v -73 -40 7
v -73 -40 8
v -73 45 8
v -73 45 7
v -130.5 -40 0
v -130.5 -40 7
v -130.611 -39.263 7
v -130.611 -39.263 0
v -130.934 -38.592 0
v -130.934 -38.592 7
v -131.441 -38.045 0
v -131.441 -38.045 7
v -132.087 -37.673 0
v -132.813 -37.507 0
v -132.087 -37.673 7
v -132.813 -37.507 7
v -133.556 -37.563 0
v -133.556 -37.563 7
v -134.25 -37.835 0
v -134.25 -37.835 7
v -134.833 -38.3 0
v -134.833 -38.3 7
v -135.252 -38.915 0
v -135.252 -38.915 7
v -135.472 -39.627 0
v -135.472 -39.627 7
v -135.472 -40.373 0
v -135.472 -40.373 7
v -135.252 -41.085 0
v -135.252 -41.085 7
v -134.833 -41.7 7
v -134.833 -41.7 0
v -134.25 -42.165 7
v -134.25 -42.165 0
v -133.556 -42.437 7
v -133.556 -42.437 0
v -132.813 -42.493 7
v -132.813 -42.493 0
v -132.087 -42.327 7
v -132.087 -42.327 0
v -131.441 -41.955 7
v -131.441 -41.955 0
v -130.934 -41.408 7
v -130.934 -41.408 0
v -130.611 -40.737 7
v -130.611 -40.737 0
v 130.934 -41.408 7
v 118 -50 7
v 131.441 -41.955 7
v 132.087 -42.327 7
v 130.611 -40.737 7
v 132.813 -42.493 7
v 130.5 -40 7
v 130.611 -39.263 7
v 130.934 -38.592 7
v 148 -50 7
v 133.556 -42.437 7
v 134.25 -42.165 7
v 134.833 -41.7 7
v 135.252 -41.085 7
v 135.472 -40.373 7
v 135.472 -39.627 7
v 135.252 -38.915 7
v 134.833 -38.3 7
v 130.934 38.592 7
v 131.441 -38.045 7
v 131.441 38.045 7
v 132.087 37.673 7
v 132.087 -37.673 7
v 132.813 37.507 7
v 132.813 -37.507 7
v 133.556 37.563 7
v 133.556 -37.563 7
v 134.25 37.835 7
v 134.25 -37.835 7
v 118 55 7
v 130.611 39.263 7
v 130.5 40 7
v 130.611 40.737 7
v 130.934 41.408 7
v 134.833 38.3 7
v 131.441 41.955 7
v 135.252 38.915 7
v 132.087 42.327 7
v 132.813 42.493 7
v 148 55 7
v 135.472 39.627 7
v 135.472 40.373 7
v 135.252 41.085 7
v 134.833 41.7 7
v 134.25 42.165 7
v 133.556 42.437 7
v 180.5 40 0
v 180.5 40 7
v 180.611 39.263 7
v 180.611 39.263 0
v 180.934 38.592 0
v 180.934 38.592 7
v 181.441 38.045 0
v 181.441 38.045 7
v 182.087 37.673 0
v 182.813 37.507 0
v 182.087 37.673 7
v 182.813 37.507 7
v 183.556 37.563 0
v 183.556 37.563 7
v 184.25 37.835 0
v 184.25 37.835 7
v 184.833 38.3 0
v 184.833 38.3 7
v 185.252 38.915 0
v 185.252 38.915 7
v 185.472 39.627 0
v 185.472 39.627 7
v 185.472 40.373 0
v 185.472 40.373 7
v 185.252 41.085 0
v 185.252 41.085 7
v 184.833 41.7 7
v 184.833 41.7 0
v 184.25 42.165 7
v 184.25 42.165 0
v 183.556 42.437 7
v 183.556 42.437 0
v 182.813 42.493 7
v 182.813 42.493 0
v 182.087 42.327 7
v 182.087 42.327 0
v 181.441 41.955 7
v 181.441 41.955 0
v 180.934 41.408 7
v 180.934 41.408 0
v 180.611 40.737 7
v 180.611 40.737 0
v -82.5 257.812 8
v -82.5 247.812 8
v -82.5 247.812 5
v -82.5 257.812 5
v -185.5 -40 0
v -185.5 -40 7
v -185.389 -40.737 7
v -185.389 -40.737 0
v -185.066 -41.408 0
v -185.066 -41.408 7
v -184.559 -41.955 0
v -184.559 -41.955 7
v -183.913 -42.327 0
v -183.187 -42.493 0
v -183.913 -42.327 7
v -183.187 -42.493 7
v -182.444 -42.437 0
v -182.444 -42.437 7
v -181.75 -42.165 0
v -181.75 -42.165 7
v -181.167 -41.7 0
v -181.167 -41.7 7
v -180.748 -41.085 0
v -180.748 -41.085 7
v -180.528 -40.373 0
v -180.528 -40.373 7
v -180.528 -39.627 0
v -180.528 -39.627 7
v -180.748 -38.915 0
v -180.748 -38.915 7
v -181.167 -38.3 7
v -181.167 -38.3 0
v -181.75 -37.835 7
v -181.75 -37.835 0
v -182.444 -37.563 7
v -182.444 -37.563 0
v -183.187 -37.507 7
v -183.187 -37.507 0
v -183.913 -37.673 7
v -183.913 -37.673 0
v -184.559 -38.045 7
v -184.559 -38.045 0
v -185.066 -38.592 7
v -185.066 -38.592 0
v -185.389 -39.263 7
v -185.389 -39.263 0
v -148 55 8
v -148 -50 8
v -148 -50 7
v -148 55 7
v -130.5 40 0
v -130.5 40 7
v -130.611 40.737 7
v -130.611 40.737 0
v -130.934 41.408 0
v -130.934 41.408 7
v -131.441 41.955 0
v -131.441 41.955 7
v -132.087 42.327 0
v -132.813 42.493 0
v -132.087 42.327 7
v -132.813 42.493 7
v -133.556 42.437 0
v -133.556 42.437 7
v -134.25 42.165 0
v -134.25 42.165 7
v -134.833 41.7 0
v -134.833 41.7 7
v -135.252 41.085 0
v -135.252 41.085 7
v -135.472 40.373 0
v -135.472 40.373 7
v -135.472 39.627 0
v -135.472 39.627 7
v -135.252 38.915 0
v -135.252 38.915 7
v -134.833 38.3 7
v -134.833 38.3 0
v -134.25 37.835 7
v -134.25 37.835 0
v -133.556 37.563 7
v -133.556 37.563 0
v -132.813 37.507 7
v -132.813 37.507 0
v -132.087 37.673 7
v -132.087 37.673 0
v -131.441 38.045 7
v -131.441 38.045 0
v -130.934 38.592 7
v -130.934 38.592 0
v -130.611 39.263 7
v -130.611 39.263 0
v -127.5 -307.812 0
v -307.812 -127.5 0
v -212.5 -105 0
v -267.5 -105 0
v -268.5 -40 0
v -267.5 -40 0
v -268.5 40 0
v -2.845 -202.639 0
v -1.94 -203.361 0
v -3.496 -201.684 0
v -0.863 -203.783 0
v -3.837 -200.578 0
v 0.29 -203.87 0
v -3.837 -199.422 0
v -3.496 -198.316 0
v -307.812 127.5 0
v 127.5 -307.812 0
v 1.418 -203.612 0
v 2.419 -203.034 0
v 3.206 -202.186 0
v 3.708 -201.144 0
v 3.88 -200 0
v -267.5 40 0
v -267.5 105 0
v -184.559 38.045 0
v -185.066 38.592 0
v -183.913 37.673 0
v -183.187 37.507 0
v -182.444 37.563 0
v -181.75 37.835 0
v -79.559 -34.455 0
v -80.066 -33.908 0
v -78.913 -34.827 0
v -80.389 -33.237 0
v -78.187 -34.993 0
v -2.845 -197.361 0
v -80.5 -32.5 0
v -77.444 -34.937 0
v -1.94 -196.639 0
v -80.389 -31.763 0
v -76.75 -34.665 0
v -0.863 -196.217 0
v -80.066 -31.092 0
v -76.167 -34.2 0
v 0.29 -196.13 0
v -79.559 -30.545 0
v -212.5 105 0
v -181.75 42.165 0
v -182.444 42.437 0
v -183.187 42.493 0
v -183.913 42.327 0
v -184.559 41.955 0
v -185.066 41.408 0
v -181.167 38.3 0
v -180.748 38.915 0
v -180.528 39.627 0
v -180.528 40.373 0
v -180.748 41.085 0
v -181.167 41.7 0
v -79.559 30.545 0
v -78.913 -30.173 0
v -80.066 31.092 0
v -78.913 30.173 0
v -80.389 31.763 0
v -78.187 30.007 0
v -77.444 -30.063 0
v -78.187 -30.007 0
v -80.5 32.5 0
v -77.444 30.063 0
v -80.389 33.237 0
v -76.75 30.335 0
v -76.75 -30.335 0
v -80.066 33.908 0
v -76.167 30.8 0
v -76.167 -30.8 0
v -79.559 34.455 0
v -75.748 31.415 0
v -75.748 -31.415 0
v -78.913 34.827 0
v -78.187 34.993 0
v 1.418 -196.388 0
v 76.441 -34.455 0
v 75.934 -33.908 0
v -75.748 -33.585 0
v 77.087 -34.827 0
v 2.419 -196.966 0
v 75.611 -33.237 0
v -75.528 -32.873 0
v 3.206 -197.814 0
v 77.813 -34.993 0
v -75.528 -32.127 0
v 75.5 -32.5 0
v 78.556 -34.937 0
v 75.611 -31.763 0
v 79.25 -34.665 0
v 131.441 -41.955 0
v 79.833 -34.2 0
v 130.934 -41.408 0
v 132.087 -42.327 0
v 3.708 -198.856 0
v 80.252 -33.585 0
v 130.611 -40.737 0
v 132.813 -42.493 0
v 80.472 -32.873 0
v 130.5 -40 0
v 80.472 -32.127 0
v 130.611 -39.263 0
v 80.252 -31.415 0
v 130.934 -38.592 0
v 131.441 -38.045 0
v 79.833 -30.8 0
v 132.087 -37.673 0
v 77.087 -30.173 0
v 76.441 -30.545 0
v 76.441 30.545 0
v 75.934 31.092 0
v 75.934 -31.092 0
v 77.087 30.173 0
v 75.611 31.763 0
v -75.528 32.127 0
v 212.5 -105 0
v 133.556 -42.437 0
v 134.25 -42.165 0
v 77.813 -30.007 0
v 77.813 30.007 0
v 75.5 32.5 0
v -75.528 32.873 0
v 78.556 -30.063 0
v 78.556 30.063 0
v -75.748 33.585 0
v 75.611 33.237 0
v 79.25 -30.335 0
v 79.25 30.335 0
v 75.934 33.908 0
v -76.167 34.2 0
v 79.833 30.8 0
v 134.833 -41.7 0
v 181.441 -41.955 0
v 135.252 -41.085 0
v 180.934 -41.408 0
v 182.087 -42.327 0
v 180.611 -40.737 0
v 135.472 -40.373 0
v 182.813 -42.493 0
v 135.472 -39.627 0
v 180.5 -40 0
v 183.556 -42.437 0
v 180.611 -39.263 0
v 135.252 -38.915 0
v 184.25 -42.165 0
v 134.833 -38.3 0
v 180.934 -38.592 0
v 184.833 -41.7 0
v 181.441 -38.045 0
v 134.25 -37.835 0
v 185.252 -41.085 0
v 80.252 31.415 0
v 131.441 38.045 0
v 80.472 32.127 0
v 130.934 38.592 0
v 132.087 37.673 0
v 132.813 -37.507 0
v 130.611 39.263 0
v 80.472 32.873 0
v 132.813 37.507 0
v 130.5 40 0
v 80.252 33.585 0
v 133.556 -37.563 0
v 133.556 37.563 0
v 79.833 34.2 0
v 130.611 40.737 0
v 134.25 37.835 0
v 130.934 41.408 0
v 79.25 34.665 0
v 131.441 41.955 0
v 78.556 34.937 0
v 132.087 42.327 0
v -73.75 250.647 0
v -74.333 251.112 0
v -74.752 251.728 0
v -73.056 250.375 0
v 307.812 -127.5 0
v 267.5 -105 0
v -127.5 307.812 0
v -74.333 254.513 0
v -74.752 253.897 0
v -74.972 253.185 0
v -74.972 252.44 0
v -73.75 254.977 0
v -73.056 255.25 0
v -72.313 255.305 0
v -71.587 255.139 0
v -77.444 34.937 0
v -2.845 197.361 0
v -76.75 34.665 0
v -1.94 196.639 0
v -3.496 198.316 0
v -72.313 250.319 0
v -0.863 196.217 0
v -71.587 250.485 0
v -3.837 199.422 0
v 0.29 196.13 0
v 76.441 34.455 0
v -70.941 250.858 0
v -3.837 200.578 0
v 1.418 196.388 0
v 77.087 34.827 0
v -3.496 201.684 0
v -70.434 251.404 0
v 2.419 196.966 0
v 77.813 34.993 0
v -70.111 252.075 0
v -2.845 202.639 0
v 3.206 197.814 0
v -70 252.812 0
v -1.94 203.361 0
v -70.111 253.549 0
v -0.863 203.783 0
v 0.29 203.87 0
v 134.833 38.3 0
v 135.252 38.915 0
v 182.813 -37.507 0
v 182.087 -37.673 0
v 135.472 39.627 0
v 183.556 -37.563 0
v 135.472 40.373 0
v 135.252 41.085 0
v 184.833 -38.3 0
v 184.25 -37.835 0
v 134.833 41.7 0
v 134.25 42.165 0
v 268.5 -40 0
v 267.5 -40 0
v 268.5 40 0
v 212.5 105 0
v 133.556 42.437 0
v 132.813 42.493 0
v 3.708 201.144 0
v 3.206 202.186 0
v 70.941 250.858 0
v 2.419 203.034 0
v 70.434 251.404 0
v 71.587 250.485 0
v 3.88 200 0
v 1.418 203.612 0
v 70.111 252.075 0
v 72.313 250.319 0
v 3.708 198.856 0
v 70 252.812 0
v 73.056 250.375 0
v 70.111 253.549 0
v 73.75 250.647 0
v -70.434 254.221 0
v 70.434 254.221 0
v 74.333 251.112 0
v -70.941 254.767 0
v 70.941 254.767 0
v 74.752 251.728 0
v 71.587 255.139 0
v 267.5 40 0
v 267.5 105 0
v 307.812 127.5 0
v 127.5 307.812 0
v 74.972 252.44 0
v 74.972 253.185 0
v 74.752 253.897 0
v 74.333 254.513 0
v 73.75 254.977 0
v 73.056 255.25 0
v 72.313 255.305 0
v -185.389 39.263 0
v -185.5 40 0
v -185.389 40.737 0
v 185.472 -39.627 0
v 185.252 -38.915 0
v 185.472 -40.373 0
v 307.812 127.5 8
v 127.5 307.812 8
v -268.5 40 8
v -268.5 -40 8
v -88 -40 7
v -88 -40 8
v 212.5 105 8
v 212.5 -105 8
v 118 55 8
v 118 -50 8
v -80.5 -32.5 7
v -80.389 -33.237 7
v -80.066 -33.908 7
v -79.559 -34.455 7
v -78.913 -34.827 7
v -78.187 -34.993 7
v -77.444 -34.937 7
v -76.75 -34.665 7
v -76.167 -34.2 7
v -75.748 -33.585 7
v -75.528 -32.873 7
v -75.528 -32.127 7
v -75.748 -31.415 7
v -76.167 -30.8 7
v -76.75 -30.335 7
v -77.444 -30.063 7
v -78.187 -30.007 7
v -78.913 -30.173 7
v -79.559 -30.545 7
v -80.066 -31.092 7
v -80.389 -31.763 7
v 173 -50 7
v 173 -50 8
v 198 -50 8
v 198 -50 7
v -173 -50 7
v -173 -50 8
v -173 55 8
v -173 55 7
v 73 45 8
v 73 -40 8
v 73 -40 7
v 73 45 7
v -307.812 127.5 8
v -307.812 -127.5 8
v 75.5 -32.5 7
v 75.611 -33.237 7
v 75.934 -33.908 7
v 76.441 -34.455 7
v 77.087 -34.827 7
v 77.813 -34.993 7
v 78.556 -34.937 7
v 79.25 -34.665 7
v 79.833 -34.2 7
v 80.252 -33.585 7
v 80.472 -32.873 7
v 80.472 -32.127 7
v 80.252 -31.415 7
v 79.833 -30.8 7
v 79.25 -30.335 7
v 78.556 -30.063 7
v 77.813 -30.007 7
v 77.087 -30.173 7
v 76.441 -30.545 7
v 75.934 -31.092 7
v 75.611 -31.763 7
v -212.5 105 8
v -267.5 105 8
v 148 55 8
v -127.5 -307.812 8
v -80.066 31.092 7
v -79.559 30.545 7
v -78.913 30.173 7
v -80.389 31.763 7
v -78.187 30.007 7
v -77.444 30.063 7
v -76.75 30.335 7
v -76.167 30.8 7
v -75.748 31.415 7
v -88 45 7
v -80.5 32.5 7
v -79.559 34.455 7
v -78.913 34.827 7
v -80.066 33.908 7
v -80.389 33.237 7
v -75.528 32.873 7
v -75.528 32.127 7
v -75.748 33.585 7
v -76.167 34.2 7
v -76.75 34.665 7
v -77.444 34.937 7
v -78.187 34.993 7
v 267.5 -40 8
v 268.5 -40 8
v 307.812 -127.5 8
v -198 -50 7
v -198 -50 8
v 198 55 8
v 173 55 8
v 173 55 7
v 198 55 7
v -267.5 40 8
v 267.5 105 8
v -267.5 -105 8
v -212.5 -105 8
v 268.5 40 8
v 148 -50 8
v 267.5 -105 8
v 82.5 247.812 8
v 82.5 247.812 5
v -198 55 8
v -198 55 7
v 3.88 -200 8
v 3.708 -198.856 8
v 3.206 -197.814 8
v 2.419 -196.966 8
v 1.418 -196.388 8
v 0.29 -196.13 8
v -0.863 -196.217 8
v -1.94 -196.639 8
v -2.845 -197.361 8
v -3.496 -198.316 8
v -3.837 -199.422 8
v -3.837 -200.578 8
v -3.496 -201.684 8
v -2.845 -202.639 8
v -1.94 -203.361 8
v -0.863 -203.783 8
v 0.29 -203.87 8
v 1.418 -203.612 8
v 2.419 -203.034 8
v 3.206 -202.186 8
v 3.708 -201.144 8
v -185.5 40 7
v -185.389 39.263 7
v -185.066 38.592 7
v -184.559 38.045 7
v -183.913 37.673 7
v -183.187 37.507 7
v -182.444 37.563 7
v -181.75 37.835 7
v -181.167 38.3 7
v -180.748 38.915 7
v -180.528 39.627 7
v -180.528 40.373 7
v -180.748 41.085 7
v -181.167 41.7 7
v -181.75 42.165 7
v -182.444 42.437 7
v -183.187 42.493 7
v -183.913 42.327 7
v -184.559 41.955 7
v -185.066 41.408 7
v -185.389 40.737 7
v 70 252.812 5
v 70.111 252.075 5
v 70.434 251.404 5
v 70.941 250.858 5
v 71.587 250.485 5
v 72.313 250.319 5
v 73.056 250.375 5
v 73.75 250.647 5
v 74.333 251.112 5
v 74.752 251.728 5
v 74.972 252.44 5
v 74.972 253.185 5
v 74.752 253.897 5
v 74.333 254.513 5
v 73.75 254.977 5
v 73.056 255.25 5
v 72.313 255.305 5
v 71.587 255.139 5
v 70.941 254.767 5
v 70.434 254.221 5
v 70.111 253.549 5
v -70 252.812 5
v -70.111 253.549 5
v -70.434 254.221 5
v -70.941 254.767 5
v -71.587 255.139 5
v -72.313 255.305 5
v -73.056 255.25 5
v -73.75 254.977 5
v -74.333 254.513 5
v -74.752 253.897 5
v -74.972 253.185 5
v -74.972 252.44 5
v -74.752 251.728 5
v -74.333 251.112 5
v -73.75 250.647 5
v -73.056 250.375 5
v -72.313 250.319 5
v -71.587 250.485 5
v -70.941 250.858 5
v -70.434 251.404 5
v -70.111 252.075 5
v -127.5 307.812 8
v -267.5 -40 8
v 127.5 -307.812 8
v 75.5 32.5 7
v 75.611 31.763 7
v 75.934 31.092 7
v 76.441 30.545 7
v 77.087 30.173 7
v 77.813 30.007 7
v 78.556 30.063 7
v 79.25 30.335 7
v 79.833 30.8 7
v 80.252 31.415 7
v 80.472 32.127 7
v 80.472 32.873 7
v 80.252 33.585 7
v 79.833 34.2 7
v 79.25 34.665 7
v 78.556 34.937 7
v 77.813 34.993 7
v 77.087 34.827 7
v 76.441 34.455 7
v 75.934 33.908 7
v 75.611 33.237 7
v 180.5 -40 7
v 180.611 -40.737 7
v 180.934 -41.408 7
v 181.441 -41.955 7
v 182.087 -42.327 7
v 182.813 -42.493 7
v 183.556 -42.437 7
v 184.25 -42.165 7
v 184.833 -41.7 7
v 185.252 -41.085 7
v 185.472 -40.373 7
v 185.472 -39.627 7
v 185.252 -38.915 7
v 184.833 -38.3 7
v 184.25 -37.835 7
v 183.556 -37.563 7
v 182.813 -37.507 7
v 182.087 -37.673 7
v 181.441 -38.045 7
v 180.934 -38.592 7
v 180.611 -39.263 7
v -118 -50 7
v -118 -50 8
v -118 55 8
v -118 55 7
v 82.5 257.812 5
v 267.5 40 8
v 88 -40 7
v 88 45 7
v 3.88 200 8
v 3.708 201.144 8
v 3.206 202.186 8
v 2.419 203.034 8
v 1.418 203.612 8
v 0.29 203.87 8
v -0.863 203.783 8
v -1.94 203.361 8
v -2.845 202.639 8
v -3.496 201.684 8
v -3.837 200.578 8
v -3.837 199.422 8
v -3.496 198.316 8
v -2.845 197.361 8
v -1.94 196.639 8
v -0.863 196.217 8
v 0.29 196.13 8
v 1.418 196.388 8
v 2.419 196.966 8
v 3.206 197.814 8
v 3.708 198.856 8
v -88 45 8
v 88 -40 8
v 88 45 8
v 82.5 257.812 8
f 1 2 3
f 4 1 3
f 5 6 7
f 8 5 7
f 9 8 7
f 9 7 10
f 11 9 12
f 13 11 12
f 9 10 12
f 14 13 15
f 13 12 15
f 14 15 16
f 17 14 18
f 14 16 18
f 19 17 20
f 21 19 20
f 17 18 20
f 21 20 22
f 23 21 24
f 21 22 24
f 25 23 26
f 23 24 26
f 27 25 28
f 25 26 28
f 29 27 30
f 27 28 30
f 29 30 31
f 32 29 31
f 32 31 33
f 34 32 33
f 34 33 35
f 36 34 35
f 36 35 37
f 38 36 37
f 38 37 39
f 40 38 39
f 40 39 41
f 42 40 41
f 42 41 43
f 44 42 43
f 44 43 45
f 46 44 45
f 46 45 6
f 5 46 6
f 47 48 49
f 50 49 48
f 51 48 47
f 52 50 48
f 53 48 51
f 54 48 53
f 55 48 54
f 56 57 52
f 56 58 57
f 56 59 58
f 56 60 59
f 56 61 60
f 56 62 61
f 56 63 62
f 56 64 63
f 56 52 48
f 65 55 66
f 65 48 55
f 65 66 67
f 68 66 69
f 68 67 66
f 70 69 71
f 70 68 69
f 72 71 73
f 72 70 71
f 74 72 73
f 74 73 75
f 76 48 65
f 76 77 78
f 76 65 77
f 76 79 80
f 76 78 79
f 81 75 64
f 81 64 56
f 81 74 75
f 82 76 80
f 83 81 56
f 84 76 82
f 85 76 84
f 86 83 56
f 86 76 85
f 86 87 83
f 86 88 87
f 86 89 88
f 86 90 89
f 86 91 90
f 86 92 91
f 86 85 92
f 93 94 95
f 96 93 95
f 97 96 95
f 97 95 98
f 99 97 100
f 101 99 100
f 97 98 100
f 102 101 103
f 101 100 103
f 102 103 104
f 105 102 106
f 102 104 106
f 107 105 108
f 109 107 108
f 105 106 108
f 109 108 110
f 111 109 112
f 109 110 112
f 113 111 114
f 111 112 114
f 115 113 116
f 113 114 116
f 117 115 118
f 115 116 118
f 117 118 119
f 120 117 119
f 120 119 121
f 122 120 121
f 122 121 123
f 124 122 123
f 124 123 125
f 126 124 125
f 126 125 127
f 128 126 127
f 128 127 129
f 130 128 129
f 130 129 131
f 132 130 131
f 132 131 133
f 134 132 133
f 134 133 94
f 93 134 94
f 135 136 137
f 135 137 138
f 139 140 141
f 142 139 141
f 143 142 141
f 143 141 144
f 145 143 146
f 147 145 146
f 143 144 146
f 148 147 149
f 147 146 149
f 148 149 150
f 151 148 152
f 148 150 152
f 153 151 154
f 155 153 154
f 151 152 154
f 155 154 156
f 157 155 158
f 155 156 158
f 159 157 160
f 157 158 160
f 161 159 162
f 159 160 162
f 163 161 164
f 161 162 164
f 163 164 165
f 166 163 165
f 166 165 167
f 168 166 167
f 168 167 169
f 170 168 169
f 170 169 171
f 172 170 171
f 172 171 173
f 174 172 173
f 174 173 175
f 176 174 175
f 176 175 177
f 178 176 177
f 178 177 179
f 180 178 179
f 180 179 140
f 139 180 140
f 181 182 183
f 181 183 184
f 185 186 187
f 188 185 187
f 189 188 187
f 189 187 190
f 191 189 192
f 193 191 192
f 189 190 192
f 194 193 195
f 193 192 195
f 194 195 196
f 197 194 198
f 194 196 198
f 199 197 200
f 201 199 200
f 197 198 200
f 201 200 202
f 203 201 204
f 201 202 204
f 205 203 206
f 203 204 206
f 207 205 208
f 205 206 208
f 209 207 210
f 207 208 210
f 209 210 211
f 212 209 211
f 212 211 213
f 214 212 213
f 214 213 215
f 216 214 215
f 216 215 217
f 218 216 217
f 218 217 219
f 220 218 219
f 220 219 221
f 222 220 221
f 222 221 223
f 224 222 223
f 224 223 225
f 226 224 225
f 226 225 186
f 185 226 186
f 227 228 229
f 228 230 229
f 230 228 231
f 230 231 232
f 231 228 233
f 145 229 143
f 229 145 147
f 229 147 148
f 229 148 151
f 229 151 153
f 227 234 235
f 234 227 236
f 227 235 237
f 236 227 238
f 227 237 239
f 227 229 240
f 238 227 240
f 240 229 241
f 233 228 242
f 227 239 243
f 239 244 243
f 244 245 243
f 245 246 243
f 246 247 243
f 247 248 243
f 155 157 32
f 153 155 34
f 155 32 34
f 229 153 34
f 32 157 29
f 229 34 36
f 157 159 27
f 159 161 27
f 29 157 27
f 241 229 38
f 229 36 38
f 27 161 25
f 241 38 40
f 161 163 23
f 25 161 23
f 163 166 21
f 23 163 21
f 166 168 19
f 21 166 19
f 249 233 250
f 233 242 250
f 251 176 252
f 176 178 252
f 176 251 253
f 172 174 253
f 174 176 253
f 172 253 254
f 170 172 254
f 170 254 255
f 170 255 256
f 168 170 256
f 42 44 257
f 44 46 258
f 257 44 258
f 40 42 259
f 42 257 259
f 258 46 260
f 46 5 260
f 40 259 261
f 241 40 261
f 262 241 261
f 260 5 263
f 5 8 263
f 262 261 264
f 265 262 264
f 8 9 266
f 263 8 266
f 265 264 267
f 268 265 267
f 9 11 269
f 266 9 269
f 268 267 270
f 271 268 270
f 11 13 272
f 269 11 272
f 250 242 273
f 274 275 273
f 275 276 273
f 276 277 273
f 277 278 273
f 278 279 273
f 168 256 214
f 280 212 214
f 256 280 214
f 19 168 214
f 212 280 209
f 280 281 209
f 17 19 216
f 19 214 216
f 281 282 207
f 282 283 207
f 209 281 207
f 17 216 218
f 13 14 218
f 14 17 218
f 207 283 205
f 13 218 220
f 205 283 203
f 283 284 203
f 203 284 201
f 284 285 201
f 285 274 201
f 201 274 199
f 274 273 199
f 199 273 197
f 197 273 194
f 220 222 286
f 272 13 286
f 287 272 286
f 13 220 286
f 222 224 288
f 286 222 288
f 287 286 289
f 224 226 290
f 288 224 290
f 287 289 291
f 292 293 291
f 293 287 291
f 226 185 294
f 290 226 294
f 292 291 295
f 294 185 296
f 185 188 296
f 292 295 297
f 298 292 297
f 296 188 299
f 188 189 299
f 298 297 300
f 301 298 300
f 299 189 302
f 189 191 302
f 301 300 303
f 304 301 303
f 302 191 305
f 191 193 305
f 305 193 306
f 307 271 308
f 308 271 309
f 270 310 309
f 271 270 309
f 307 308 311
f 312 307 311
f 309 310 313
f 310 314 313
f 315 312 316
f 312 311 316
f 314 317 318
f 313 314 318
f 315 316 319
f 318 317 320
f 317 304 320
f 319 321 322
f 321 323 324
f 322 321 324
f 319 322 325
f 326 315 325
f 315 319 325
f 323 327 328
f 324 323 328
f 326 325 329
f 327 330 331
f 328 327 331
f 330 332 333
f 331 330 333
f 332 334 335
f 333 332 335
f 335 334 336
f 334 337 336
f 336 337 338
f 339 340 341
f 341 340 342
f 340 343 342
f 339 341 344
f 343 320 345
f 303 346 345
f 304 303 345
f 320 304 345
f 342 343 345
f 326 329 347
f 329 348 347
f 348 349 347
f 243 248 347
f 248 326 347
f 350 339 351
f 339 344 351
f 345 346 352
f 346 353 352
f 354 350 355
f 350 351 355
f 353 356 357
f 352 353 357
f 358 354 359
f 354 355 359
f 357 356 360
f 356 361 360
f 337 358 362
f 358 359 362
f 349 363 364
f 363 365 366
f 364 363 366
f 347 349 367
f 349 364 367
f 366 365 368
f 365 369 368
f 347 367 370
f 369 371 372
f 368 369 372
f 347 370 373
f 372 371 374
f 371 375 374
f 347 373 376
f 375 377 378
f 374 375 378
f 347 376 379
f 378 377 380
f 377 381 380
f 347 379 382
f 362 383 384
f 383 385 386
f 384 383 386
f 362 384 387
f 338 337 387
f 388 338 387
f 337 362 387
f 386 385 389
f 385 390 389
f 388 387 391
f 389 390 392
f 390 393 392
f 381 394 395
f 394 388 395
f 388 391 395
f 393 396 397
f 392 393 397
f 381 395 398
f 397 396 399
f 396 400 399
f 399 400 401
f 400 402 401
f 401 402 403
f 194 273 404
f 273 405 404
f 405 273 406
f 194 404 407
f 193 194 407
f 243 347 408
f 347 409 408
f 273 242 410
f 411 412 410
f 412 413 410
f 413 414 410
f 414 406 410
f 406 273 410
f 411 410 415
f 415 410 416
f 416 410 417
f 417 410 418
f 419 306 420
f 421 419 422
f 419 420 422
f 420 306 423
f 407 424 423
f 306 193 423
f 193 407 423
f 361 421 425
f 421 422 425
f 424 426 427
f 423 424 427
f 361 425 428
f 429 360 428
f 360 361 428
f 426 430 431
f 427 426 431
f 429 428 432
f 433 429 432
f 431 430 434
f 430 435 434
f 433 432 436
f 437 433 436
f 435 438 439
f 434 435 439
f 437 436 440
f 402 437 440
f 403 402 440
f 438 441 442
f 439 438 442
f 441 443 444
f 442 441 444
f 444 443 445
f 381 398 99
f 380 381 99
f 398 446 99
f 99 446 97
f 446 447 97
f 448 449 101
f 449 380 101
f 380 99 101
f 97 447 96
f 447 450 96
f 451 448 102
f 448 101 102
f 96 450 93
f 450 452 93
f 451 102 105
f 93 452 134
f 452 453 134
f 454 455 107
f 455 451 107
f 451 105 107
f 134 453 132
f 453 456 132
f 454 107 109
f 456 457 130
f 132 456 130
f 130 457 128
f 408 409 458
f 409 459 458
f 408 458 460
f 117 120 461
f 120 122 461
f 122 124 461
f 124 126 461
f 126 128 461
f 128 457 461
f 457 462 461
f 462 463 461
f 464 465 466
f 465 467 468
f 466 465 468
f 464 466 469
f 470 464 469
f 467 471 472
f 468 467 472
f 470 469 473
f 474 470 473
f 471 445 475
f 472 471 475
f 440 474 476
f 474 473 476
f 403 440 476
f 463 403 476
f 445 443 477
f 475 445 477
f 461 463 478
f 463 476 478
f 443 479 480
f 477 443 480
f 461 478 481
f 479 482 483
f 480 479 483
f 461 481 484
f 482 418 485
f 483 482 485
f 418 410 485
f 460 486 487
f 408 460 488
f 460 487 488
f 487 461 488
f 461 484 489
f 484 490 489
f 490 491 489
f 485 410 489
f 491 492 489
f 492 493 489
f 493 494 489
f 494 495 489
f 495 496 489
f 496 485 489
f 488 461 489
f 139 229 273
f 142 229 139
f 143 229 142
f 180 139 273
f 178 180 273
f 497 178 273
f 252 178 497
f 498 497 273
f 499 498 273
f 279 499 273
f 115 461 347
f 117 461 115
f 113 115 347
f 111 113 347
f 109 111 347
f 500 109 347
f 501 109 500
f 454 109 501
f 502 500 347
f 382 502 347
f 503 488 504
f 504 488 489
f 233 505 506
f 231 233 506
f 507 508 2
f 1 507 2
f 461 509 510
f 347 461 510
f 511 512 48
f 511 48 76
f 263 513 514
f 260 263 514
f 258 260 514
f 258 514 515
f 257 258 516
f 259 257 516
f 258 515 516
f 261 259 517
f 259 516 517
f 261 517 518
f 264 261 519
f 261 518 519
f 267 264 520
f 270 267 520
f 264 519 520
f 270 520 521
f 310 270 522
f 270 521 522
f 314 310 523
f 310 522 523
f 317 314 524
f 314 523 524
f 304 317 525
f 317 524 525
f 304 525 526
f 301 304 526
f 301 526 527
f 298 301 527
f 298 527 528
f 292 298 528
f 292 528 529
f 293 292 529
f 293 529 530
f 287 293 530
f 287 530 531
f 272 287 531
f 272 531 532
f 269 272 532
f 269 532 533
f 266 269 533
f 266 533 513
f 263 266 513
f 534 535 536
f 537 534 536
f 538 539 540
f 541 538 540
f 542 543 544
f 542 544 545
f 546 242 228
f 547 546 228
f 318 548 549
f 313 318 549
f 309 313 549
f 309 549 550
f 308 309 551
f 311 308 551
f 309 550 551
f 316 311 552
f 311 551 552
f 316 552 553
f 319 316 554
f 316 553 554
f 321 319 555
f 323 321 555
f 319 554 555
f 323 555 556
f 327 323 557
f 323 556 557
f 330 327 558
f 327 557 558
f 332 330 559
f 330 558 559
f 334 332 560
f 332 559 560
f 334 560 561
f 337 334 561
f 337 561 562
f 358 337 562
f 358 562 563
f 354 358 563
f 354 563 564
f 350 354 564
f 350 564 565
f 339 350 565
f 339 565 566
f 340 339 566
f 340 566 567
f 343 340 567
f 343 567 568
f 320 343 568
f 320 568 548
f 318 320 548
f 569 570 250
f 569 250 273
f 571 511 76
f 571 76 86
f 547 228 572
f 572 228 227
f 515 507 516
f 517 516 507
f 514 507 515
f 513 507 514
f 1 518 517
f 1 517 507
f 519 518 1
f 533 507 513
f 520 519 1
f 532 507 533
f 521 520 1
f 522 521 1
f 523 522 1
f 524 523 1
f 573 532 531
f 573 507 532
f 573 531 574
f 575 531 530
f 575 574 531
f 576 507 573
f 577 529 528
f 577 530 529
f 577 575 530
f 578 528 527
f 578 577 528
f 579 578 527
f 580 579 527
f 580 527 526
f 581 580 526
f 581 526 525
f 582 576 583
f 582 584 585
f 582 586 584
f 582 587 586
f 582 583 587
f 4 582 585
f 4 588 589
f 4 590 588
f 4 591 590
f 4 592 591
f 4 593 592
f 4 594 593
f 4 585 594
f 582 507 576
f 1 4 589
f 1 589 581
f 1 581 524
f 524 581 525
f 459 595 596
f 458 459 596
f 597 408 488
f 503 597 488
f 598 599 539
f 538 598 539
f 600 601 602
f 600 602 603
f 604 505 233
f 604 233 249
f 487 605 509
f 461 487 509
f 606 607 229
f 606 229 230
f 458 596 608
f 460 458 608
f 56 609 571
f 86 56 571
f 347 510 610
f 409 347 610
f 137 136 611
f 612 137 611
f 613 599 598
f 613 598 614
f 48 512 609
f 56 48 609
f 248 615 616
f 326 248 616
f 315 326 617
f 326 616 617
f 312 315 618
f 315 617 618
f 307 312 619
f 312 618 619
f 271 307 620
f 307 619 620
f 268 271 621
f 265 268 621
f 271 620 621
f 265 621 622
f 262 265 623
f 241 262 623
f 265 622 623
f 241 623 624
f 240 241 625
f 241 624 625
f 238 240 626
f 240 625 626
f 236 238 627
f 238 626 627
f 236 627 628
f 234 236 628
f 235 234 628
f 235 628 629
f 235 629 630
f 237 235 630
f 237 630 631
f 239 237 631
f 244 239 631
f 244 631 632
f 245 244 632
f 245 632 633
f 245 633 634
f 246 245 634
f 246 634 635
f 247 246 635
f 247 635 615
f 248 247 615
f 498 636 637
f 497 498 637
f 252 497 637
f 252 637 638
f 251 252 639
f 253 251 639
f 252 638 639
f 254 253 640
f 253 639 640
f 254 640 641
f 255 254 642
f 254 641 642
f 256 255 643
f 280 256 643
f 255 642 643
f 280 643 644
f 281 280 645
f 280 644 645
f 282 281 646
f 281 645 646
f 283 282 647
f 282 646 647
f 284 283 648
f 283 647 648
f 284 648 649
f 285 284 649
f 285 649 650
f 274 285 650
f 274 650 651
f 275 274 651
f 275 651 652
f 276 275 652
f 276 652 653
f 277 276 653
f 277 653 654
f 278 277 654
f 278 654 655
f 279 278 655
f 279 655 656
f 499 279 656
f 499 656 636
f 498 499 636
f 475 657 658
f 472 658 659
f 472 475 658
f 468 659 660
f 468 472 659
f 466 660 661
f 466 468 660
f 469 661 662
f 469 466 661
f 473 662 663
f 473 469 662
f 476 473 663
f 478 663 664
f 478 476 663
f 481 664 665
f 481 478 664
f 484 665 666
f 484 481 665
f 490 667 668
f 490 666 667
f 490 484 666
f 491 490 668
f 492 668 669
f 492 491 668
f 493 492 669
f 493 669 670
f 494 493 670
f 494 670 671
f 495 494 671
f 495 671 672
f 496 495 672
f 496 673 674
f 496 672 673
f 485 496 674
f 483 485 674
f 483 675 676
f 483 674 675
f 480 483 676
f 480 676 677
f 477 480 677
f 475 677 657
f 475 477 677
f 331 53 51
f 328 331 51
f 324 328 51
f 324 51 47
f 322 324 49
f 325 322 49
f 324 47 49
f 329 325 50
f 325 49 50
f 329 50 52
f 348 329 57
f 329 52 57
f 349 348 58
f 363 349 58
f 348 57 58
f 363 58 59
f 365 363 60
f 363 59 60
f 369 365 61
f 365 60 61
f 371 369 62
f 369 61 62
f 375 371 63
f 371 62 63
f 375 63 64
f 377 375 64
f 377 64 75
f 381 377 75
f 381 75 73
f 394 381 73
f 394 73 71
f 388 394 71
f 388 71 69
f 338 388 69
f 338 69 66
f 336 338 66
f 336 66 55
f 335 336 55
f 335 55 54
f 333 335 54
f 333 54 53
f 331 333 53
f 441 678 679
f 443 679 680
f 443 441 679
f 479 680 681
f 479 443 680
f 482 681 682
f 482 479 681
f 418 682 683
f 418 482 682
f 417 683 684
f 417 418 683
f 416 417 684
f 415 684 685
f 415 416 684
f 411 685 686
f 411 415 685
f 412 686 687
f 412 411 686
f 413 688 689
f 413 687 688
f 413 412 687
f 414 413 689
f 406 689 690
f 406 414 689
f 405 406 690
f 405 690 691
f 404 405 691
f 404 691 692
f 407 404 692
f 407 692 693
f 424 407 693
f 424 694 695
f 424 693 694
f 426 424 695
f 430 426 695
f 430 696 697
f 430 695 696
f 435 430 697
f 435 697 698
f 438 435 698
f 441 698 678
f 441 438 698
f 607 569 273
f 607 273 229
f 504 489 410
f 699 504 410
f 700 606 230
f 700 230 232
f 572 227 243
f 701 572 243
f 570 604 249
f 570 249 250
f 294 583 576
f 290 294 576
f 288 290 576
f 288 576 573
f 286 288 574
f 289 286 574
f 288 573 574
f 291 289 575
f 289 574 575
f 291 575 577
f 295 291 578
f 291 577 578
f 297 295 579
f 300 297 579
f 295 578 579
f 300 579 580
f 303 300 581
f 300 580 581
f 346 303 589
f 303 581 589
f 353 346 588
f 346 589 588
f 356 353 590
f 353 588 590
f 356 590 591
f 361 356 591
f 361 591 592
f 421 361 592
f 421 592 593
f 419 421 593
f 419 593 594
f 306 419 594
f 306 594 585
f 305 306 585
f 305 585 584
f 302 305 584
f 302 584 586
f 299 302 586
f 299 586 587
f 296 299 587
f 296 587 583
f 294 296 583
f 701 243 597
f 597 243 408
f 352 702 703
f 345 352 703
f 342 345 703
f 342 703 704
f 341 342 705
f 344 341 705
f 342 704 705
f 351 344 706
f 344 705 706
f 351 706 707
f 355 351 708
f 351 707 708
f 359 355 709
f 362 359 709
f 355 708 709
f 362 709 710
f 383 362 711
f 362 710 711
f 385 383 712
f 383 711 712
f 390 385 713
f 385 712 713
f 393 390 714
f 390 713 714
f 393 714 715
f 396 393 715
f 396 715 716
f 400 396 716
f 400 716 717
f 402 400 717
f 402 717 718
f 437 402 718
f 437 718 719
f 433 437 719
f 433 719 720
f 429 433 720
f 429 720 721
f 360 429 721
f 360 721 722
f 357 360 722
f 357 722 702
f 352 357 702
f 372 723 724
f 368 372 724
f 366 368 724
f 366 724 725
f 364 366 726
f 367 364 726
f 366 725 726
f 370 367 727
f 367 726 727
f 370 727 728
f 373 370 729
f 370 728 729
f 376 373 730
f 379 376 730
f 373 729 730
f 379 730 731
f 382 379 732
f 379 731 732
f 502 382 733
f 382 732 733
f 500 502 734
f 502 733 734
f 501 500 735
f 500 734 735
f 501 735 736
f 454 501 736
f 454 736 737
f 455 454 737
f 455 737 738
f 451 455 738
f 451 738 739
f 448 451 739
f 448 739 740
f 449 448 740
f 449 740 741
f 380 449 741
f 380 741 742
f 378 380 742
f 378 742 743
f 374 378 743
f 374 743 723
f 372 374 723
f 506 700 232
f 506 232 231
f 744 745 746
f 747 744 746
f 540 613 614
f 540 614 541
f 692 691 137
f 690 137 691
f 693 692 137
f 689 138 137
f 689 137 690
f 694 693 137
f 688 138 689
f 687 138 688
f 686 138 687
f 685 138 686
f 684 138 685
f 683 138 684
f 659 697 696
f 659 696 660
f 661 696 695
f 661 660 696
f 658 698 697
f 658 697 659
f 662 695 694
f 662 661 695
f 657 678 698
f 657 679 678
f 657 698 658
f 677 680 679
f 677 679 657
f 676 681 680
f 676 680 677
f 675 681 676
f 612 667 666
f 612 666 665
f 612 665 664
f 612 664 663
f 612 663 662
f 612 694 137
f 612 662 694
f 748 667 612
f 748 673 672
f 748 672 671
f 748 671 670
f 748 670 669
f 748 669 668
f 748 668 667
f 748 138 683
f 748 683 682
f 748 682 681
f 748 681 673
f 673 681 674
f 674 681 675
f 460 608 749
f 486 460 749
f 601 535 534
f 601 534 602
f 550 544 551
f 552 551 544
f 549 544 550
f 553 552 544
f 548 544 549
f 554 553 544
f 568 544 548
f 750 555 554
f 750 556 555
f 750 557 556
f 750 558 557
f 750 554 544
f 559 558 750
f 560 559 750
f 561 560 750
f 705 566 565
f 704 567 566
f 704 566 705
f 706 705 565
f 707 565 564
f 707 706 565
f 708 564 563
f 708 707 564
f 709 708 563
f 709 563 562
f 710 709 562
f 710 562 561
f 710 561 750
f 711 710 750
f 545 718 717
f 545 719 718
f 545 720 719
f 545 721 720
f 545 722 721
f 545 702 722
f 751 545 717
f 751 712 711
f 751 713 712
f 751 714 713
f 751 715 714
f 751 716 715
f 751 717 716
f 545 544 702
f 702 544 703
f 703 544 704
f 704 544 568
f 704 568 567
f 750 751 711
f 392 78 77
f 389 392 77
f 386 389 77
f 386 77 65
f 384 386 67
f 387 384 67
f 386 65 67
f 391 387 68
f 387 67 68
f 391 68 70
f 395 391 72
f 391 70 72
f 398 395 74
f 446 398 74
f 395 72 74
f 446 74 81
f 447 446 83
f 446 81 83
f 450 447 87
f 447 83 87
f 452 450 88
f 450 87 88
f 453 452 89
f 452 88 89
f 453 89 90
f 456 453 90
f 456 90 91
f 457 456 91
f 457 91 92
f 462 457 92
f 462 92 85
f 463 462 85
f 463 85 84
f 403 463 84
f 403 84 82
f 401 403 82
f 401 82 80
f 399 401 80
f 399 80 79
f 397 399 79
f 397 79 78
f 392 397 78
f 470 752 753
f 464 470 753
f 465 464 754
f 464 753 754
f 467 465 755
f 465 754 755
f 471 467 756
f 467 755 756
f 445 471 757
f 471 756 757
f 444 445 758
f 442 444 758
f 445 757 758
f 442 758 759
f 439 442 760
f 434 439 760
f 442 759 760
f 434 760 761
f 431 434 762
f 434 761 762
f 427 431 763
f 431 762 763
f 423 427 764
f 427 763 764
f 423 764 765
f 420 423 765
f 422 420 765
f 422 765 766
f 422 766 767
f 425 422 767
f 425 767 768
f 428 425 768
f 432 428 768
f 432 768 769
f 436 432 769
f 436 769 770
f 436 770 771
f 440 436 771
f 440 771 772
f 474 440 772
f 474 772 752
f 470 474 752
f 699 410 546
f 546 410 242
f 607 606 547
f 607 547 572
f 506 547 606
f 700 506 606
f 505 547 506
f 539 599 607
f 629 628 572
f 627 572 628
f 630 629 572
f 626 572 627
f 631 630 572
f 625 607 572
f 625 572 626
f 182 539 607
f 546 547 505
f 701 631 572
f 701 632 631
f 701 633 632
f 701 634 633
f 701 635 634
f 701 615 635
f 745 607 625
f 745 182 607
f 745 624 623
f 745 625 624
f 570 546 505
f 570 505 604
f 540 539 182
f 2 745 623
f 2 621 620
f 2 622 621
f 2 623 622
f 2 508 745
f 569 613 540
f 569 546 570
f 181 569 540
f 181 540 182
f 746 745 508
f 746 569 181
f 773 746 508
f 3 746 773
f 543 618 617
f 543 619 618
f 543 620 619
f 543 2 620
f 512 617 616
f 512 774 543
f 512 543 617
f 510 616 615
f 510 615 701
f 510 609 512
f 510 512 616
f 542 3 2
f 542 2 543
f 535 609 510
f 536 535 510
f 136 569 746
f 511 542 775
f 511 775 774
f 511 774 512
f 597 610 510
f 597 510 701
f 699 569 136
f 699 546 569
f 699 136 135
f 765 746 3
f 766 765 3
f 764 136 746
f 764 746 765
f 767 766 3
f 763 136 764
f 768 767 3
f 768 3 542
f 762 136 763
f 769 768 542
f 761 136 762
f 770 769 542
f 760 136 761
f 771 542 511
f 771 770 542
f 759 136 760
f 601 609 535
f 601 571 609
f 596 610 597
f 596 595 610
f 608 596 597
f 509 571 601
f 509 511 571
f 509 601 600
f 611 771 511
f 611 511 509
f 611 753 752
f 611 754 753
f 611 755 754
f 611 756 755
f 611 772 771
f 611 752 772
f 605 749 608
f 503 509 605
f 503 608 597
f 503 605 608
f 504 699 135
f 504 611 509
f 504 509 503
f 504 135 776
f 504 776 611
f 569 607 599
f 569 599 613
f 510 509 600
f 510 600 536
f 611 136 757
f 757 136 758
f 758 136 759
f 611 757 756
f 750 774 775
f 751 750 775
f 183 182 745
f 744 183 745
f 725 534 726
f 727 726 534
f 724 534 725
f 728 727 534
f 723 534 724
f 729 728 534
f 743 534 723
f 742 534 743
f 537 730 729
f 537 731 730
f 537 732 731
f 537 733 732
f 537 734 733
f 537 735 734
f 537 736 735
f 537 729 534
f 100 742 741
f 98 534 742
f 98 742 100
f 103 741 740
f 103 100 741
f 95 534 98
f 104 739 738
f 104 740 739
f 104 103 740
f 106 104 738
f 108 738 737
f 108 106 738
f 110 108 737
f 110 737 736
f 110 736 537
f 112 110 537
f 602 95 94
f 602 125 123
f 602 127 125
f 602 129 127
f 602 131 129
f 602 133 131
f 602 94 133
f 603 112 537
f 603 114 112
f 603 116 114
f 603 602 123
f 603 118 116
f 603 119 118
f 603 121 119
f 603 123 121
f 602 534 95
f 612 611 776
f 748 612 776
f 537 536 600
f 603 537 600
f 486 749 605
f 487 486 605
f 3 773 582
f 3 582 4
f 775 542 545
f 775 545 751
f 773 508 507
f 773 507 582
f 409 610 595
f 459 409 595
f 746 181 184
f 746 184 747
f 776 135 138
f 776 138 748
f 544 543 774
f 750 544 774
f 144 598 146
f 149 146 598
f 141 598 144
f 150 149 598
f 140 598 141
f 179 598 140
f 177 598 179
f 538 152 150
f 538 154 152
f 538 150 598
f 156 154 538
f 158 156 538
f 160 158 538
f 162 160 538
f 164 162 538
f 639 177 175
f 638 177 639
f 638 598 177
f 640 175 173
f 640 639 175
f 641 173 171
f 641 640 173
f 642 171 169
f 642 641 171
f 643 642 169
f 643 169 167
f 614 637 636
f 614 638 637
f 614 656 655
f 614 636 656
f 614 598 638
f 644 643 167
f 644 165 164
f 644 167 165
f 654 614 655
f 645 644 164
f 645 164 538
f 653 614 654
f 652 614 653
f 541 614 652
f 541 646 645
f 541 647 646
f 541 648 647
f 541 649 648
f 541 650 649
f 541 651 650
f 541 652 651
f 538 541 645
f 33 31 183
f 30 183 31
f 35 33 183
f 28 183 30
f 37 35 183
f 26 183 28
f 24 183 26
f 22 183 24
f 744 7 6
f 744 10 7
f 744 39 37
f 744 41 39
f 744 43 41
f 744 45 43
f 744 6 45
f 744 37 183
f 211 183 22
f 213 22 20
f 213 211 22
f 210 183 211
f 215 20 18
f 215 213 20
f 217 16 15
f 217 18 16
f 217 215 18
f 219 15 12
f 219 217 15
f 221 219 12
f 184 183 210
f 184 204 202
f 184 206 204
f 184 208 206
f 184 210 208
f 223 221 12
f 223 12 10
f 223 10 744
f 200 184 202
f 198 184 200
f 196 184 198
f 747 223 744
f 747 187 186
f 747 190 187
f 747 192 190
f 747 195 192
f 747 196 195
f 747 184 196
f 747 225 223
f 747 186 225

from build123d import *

# Parameters (mm, degrees)
BOSS_EXTRUDE1_DEPTH = 8
SKETCH2_R           = 3.8805
CUT_EXTRUDE1_DEPTH  = 10
SKETCH5_W           = 15
SKETCH5_H           = 85
SKETCH5_R           = 2.5
SKETCH5_W_2         = 25
SKETCH5_H_2         = 105
SKETCH5_W_3         = 30
CUT_EXTRUDE4_DEPTH  = 1
CUT_EXTRUDE7_START  = 91
SKETCH10_R          = 2.5
CUT_EXTRUDE7_DEPTH  = 91
SKETCH12_W          = 165
SKETCH12_H          = 10
SKETCH12_R          = 2
CUT_EXTRUDE11_DEPTH = 3
SKETCH14_R          = 2.5
CUT_EXTRUDE14_DEPTH = 22


with BuildPart() as part:
    # Sketch1 → Boss-Extrude1 (new body)
    with BuildSketch(Plane.XY):
        Polygon((307.812229203, 127.5), (127.5, 307.812229203), (-127.5, 307.812229203), (-307.812229203, 127.5), (-307.812229203, -127.5), (-127.5, -307.812229203), (127.5, -307.812229203), (307.812229203, -127.5), align=None)
    extrude(amount=BOSS_EXTRUDE1_DEPTH)

    # Sketch2 → Cut-Extrude1 (cut)
    with BuildSketch(Plane.XY.offset(8)):
        with Locations((0, 200)):
            Circle(SKETCH2_R)
        with Locations((0, -200)):
            Circle(SKETCH2_R)
        Polygon((212.5, 105), (212.5, -105), (267.5, -105), (267.5, -40), (268.5, -40), (268.5, 0), (268.5, 40), (267.5, 40), (267.5, 105), align=None)
        Polygon((-267.5, 105), (-212.5, 105), (-212.5, -105), (-267.5, -105), (-267.5, -40), (-268.5, -40), (-268.5, 0), (-268.5, 40), (-267.5, 40), align=None)
    extrude(amount=-CUT_EXTRUDE1_DEPTH, mode=Mode.SUBTRACT)

    # Sketch5 → Cut-Extrude4 (cut)
    # profile 1 of 6: a face of its own
    with BuildSketch(Plane.XY.offset(8)):
        with Locations((80.5, 2.5)):
            Rectangle(SKETCH5_W, SKETCH5_H)
        with Locations((78, 32.5)):
            Circle(SKETCH5_R, mode=Mode.SUBTRACT)
        with Locations((78, -32.5)):
            Circle(SKETCH5_R, mode=Mode.SUBTRACT)
    # profile 2 of 6: a face of its own
    with BuildSketch(Plane.XY.offset(8)):
        with Locations((-185.5, 2.5)):
            Rectangle(SKETCH5_W_2, SKETCH5_H_2)
        with Locations((-183, -40)):
            Circle(SKETCH5_R, mode=Mode.SUBTRACT)
        with Locations((-183, 40)):
            Circle(SKETCH5_R, mode=Mode.SUBTRACT)
    # profile 3 of 6: a face of its own
    with BuildSketch(Plane.XY.offset(8)):
        with Locations((-133, 2.5)):
            Rectangle(SKETCH5_W_3, SKETCH5_H_2)
        with Locations((-133, -40)):
            Circle(SKETCH5_R, mode=Mode.SUBTRACT)
        with Locations((-133, 40)):
            Circle(SKETCH5_R, mode=Mode.SUBTRACT)
    # profile 4 of 6: a face of its own
    with BuildSketch(Plane.XY.offset(8)):
        with Locations((-80.5, 2.5)):
            Rectangle(SKETCH5_W, SKETCH5_H)
        with Locations((-78, -32.5)):
            Circle(SKETCH5_R, mode=Mode.SUBTRACT)
        with Locations((-78, 32.5)):
            Circle(SKETCH5_R, mode=Mode.SUBTRACT)
    # profile 5 of 6: a face of its own
    with BuildSketch(Plane.XY.offset(8)):
        with Locations((133, 2.5)):
            Rectangle(SKETCH5_W_3, SKETCH5_H_2)
        with Locations((133, 40)):
            Circle(SKETCH5_R, mode=Mode.SUBTRACT)
        with Locations((133, -40)):
            Circle(SKETCH5_R, mode=Mode.SUBTRACT)
    # profile 6 of 6: a face of its own
    with BuildSketch(Plane.XY.offset(8)):
        with Locations((185.5, 2.5)):
            Rectangle(SKETCH5_W_2, SKETCH5_H_2)
        with Locations((183, 40)):
            Circle(SKETCH5_R, mode=Mode.SUBTRACT)
        with Locations((183, -40)):
            Circle(SKETCH5_R, mode=Mode.SUBTRACT)
    extrude(amount=-CUT_EXTRUDE4_DEPTH, mode=Mode.SUBTRACT)

    # Sketch10 → Cut-Extrude7 (cut)
    with BuildSketch(Plane.XY.offset(CUT_EXTRUDE7_START)):
        with Locations((-183, -40)):
            Circle(SKETCH10_R)
        with Locations((-183, 40)):
            Circle(SKETCH10_R)
        with Locations((-133, -40)):
            Circle(SKETCH10_R)
        with Locations((-133, 40)):
            Circle(SKETCH10_R)
        with Locations((-78, -32.5)):
            Circle(SKETCH10_R)
        with Locations((-78, 32.5)):
            Circle(SKETCH10_R)
        with Locations((78, 32.5)):
            Circle(SKETCH10_R)
        with Locations((78, -32.5)):
            Circle(SKETCH10_R)
        with Locations((133, 40)):
            Circle(SKETCH10_R)
        with Locations((133, -40)):
            Circle(SKETCH10_R)
        with Locations((183, 40)):
            Circle(SKETCH10_R)
        with Locations((183, -40)):
            Circle(SKETCH10_R)
    extrude(amount=-CUT_EXTRUDE7_DEPTH, mode=Mode.SUBTRACT)

    # Sketch12 → Cut-Extrude11 (cut)
    with BuildSketch(Plane.XY.offset(8)):
        with Locations((0, 252.812229203)):
            Rectangle(SKETCH12_W, SKETCH12_H)
        with Locations((-72.5, 252.812229203)):
            Circle(SKETCH12_R, mode=Mode.SUBTRACT)
        with Locations((72.5, 252.812229203)):
            Circle(SKETCH12_R, mode=Mode.SUBTRACT)
    extrude(amount=-CUT_EXTRUDE11_DEPTH, mode=Mode.SUBTRACT)

    # Sketch14 → Cut-Extrude14 (cut)
    with BuildSketch(Plane.XY):
        with Locations((-72.5, 252.812229203)):
            Circle(SKETCH14_R)
        with Locations((72.5, 252.812229203)):
            Circle(SKETCH14_R)
    extrude(amount=CUT_EXTRUDE14_DEPTH, mode=Mode.SUBTRACT)


solid = part.part
